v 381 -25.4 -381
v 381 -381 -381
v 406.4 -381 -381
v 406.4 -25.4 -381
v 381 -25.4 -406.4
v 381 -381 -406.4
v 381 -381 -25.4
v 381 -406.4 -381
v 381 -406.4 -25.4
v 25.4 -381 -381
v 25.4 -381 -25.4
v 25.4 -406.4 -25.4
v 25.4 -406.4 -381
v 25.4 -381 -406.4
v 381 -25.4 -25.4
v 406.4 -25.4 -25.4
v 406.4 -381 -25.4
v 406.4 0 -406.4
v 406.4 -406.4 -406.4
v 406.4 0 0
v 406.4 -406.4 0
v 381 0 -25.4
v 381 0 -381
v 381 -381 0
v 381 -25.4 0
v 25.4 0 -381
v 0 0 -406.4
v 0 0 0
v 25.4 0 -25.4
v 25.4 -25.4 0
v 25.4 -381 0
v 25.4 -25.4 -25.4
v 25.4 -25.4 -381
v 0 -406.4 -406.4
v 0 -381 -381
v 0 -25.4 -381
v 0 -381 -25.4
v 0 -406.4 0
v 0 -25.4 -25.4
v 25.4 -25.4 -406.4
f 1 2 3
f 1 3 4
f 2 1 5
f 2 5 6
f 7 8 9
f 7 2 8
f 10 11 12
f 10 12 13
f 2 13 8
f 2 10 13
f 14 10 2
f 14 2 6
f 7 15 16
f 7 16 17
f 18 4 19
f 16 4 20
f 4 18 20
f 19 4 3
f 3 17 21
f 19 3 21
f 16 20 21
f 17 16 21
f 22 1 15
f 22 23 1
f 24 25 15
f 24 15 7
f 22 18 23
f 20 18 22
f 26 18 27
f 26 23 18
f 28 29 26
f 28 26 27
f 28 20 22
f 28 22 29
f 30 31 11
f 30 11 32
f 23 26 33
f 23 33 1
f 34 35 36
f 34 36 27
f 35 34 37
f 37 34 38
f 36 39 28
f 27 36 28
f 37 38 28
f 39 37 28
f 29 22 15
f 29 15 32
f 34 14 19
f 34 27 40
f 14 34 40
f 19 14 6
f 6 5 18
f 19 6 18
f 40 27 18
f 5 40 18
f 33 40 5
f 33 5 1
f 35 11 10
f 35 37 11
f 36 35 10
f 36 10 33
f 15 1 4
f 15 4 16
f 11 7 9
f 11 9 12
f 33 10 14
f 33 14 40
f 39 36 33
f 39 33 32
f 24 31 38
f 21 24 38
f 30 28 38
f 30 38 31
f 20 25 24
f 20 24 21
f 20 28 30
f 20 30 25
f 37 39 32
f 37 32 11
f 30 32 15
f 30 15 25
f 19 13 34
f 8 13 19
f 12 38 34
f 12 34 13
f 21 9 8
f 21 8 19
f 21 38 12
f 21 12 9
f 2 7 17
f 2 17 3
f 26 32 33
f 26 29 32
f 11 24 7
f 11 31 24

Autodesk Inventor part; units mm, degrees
ref_plane "YZ Plane" through (0, 0, 0) normal (1, 0, 0) x (0, 1, 0)
ref_plane "XZ Plane" through (0, 0, 0) normal (0, 1, 0) x (-1, 0, 0)
ref_plane "XY Plane" through (0, 0, 0) normal (0, 0, 1) x (1, 0, 0)
sketch "Sketch3" plane through (0, 0, 0) normal (0, 0, 1) x (1, 0, 0)
  line L0 (0, 0) -> (812.8, 0) construction
  line L1 (812.8, 0) -> (812.8, -406.4) construction
  line L2 (812.8, -406.4) -> (0, -406.4) construction
  line L3 (0, -406.4) -> (0, 0) construction
  line L4 (406.4, 0) -> (0, 0)
  line L5 (0, -406.4) -> (0, 0)
  line L6 (0, -406.4) -> (406.4, -406.4)
  line L7 (406.4, 0) -> (406.4, -406.4)
  dimension "d88" = 812.8
extrude "Extrusion2" add sketch "Sketch3" against normal blind 406.4
sketch "Sketch4" plane through (0, 0, 0) normal (0, 0, 1) x (1, 0, 0)
  line L0 (0, 0) -> (406.4, 0) projected
  line L1 (0, 0) -> (812.8, 0) construction
  line L2 (812.8, 0) -> (812.8, -406.4) construction
  line L3 (812.8, -406.4) -> (0, -406.4) construction
  line L4 (0, -406.4) -> (0, 0) construction
  line L5 (0, 0) -> (25.4, 0)
  line L6 (25.4, 0) -> (25.4, -25.4)
  line L7 (25.4, -25.4) -> (0, -25.4)
  line L8 (0, -25.4) -> (0, 0)
  line L9 (25.4, -25.4) -> (381, -25.4)
  line L10 (381, -25.4) -> (381, -381)
  line L11 (381, -381) -> (25.4, -381)
  line L12 (25.4, -381) -> (25.4, -25.4)
  dimension "d95" = 812.8
  dimension "d102" = 25.4
  dimension "d103" = 25.4
  dimension "d104" = 355.6
  dimension "d105" = 355.6
extrude "Extrusion3" cut sketch "Sketch4" against normal blind 406.4 contours L9 L10 L11 L12
sketch "Sketch5" plane through (0, -406.4, 0) normal (-1, 0, 0) x (0, 0, 1)
  line L0 (0, 406.4) -> (-406.4, 406.4) projected
  line L1 (-406.4, 406.4) -> (-381, 406.4)
  line L2 (-381, 406.4) -> (-381, 381)
  line L3 (-381, 381) -> (-406.4, 381)
  line L4 (-406.4, 381) -> (-406.4, 406.4)
  line L5 (-381, 381) -> (-25.4, 381)
  line L6 (-25.4, 381) -> (-25.4, 25.4)
  line L7 (-25.4, 25.4) -> (-381, 25.4)
  line L8 (-381, 25.4) -> (-381, 381)
  dimension "d108" = 25.4
  dimension "d109" = 25.4
  dimension "d110" = 355.6
  dimension "d111" = 355.6
extrude "Extrusion4" cut sketch "Sketch5" against normal blind 406.4 contours L5 L6 L7 L8
sketch "Sketch6" plane through (0, 0, 0) normal (0, 1, 0) x (1, 0, 0)
  line L0 (0, 406.4) -> (406.4, 406.4) projected
  line L1 (0, 406.4) -> (25.4, 406.4)
  line L2 (25.4, 406.4) -> (25.4, 381)
  line L3 (25.4, 381) -> (0, 381)
  line L4 (0, 381) -> (0, 406.4)
  line L5 (25.4, 381) -> (381, 381)
  line L6 (381, 381) -> (381, 25.4)
  line L7 (381, 25.4) -> (25.4, 25.4)
  line L8 (25.4, 25.4) -> (25.4, 381)
  point P0 (0, 0)
  dimension "d114" = 25.4
  dimension "d115" = 25.4
  dimension "d116" = 355.6
  dimension "d117" = 355.6
extrude "Extrusion5" cut sketch "Sketch6" against normal blind 406.4 contours L5 L6 L7 L8
properties part number "JukeBox Metal Frame"
